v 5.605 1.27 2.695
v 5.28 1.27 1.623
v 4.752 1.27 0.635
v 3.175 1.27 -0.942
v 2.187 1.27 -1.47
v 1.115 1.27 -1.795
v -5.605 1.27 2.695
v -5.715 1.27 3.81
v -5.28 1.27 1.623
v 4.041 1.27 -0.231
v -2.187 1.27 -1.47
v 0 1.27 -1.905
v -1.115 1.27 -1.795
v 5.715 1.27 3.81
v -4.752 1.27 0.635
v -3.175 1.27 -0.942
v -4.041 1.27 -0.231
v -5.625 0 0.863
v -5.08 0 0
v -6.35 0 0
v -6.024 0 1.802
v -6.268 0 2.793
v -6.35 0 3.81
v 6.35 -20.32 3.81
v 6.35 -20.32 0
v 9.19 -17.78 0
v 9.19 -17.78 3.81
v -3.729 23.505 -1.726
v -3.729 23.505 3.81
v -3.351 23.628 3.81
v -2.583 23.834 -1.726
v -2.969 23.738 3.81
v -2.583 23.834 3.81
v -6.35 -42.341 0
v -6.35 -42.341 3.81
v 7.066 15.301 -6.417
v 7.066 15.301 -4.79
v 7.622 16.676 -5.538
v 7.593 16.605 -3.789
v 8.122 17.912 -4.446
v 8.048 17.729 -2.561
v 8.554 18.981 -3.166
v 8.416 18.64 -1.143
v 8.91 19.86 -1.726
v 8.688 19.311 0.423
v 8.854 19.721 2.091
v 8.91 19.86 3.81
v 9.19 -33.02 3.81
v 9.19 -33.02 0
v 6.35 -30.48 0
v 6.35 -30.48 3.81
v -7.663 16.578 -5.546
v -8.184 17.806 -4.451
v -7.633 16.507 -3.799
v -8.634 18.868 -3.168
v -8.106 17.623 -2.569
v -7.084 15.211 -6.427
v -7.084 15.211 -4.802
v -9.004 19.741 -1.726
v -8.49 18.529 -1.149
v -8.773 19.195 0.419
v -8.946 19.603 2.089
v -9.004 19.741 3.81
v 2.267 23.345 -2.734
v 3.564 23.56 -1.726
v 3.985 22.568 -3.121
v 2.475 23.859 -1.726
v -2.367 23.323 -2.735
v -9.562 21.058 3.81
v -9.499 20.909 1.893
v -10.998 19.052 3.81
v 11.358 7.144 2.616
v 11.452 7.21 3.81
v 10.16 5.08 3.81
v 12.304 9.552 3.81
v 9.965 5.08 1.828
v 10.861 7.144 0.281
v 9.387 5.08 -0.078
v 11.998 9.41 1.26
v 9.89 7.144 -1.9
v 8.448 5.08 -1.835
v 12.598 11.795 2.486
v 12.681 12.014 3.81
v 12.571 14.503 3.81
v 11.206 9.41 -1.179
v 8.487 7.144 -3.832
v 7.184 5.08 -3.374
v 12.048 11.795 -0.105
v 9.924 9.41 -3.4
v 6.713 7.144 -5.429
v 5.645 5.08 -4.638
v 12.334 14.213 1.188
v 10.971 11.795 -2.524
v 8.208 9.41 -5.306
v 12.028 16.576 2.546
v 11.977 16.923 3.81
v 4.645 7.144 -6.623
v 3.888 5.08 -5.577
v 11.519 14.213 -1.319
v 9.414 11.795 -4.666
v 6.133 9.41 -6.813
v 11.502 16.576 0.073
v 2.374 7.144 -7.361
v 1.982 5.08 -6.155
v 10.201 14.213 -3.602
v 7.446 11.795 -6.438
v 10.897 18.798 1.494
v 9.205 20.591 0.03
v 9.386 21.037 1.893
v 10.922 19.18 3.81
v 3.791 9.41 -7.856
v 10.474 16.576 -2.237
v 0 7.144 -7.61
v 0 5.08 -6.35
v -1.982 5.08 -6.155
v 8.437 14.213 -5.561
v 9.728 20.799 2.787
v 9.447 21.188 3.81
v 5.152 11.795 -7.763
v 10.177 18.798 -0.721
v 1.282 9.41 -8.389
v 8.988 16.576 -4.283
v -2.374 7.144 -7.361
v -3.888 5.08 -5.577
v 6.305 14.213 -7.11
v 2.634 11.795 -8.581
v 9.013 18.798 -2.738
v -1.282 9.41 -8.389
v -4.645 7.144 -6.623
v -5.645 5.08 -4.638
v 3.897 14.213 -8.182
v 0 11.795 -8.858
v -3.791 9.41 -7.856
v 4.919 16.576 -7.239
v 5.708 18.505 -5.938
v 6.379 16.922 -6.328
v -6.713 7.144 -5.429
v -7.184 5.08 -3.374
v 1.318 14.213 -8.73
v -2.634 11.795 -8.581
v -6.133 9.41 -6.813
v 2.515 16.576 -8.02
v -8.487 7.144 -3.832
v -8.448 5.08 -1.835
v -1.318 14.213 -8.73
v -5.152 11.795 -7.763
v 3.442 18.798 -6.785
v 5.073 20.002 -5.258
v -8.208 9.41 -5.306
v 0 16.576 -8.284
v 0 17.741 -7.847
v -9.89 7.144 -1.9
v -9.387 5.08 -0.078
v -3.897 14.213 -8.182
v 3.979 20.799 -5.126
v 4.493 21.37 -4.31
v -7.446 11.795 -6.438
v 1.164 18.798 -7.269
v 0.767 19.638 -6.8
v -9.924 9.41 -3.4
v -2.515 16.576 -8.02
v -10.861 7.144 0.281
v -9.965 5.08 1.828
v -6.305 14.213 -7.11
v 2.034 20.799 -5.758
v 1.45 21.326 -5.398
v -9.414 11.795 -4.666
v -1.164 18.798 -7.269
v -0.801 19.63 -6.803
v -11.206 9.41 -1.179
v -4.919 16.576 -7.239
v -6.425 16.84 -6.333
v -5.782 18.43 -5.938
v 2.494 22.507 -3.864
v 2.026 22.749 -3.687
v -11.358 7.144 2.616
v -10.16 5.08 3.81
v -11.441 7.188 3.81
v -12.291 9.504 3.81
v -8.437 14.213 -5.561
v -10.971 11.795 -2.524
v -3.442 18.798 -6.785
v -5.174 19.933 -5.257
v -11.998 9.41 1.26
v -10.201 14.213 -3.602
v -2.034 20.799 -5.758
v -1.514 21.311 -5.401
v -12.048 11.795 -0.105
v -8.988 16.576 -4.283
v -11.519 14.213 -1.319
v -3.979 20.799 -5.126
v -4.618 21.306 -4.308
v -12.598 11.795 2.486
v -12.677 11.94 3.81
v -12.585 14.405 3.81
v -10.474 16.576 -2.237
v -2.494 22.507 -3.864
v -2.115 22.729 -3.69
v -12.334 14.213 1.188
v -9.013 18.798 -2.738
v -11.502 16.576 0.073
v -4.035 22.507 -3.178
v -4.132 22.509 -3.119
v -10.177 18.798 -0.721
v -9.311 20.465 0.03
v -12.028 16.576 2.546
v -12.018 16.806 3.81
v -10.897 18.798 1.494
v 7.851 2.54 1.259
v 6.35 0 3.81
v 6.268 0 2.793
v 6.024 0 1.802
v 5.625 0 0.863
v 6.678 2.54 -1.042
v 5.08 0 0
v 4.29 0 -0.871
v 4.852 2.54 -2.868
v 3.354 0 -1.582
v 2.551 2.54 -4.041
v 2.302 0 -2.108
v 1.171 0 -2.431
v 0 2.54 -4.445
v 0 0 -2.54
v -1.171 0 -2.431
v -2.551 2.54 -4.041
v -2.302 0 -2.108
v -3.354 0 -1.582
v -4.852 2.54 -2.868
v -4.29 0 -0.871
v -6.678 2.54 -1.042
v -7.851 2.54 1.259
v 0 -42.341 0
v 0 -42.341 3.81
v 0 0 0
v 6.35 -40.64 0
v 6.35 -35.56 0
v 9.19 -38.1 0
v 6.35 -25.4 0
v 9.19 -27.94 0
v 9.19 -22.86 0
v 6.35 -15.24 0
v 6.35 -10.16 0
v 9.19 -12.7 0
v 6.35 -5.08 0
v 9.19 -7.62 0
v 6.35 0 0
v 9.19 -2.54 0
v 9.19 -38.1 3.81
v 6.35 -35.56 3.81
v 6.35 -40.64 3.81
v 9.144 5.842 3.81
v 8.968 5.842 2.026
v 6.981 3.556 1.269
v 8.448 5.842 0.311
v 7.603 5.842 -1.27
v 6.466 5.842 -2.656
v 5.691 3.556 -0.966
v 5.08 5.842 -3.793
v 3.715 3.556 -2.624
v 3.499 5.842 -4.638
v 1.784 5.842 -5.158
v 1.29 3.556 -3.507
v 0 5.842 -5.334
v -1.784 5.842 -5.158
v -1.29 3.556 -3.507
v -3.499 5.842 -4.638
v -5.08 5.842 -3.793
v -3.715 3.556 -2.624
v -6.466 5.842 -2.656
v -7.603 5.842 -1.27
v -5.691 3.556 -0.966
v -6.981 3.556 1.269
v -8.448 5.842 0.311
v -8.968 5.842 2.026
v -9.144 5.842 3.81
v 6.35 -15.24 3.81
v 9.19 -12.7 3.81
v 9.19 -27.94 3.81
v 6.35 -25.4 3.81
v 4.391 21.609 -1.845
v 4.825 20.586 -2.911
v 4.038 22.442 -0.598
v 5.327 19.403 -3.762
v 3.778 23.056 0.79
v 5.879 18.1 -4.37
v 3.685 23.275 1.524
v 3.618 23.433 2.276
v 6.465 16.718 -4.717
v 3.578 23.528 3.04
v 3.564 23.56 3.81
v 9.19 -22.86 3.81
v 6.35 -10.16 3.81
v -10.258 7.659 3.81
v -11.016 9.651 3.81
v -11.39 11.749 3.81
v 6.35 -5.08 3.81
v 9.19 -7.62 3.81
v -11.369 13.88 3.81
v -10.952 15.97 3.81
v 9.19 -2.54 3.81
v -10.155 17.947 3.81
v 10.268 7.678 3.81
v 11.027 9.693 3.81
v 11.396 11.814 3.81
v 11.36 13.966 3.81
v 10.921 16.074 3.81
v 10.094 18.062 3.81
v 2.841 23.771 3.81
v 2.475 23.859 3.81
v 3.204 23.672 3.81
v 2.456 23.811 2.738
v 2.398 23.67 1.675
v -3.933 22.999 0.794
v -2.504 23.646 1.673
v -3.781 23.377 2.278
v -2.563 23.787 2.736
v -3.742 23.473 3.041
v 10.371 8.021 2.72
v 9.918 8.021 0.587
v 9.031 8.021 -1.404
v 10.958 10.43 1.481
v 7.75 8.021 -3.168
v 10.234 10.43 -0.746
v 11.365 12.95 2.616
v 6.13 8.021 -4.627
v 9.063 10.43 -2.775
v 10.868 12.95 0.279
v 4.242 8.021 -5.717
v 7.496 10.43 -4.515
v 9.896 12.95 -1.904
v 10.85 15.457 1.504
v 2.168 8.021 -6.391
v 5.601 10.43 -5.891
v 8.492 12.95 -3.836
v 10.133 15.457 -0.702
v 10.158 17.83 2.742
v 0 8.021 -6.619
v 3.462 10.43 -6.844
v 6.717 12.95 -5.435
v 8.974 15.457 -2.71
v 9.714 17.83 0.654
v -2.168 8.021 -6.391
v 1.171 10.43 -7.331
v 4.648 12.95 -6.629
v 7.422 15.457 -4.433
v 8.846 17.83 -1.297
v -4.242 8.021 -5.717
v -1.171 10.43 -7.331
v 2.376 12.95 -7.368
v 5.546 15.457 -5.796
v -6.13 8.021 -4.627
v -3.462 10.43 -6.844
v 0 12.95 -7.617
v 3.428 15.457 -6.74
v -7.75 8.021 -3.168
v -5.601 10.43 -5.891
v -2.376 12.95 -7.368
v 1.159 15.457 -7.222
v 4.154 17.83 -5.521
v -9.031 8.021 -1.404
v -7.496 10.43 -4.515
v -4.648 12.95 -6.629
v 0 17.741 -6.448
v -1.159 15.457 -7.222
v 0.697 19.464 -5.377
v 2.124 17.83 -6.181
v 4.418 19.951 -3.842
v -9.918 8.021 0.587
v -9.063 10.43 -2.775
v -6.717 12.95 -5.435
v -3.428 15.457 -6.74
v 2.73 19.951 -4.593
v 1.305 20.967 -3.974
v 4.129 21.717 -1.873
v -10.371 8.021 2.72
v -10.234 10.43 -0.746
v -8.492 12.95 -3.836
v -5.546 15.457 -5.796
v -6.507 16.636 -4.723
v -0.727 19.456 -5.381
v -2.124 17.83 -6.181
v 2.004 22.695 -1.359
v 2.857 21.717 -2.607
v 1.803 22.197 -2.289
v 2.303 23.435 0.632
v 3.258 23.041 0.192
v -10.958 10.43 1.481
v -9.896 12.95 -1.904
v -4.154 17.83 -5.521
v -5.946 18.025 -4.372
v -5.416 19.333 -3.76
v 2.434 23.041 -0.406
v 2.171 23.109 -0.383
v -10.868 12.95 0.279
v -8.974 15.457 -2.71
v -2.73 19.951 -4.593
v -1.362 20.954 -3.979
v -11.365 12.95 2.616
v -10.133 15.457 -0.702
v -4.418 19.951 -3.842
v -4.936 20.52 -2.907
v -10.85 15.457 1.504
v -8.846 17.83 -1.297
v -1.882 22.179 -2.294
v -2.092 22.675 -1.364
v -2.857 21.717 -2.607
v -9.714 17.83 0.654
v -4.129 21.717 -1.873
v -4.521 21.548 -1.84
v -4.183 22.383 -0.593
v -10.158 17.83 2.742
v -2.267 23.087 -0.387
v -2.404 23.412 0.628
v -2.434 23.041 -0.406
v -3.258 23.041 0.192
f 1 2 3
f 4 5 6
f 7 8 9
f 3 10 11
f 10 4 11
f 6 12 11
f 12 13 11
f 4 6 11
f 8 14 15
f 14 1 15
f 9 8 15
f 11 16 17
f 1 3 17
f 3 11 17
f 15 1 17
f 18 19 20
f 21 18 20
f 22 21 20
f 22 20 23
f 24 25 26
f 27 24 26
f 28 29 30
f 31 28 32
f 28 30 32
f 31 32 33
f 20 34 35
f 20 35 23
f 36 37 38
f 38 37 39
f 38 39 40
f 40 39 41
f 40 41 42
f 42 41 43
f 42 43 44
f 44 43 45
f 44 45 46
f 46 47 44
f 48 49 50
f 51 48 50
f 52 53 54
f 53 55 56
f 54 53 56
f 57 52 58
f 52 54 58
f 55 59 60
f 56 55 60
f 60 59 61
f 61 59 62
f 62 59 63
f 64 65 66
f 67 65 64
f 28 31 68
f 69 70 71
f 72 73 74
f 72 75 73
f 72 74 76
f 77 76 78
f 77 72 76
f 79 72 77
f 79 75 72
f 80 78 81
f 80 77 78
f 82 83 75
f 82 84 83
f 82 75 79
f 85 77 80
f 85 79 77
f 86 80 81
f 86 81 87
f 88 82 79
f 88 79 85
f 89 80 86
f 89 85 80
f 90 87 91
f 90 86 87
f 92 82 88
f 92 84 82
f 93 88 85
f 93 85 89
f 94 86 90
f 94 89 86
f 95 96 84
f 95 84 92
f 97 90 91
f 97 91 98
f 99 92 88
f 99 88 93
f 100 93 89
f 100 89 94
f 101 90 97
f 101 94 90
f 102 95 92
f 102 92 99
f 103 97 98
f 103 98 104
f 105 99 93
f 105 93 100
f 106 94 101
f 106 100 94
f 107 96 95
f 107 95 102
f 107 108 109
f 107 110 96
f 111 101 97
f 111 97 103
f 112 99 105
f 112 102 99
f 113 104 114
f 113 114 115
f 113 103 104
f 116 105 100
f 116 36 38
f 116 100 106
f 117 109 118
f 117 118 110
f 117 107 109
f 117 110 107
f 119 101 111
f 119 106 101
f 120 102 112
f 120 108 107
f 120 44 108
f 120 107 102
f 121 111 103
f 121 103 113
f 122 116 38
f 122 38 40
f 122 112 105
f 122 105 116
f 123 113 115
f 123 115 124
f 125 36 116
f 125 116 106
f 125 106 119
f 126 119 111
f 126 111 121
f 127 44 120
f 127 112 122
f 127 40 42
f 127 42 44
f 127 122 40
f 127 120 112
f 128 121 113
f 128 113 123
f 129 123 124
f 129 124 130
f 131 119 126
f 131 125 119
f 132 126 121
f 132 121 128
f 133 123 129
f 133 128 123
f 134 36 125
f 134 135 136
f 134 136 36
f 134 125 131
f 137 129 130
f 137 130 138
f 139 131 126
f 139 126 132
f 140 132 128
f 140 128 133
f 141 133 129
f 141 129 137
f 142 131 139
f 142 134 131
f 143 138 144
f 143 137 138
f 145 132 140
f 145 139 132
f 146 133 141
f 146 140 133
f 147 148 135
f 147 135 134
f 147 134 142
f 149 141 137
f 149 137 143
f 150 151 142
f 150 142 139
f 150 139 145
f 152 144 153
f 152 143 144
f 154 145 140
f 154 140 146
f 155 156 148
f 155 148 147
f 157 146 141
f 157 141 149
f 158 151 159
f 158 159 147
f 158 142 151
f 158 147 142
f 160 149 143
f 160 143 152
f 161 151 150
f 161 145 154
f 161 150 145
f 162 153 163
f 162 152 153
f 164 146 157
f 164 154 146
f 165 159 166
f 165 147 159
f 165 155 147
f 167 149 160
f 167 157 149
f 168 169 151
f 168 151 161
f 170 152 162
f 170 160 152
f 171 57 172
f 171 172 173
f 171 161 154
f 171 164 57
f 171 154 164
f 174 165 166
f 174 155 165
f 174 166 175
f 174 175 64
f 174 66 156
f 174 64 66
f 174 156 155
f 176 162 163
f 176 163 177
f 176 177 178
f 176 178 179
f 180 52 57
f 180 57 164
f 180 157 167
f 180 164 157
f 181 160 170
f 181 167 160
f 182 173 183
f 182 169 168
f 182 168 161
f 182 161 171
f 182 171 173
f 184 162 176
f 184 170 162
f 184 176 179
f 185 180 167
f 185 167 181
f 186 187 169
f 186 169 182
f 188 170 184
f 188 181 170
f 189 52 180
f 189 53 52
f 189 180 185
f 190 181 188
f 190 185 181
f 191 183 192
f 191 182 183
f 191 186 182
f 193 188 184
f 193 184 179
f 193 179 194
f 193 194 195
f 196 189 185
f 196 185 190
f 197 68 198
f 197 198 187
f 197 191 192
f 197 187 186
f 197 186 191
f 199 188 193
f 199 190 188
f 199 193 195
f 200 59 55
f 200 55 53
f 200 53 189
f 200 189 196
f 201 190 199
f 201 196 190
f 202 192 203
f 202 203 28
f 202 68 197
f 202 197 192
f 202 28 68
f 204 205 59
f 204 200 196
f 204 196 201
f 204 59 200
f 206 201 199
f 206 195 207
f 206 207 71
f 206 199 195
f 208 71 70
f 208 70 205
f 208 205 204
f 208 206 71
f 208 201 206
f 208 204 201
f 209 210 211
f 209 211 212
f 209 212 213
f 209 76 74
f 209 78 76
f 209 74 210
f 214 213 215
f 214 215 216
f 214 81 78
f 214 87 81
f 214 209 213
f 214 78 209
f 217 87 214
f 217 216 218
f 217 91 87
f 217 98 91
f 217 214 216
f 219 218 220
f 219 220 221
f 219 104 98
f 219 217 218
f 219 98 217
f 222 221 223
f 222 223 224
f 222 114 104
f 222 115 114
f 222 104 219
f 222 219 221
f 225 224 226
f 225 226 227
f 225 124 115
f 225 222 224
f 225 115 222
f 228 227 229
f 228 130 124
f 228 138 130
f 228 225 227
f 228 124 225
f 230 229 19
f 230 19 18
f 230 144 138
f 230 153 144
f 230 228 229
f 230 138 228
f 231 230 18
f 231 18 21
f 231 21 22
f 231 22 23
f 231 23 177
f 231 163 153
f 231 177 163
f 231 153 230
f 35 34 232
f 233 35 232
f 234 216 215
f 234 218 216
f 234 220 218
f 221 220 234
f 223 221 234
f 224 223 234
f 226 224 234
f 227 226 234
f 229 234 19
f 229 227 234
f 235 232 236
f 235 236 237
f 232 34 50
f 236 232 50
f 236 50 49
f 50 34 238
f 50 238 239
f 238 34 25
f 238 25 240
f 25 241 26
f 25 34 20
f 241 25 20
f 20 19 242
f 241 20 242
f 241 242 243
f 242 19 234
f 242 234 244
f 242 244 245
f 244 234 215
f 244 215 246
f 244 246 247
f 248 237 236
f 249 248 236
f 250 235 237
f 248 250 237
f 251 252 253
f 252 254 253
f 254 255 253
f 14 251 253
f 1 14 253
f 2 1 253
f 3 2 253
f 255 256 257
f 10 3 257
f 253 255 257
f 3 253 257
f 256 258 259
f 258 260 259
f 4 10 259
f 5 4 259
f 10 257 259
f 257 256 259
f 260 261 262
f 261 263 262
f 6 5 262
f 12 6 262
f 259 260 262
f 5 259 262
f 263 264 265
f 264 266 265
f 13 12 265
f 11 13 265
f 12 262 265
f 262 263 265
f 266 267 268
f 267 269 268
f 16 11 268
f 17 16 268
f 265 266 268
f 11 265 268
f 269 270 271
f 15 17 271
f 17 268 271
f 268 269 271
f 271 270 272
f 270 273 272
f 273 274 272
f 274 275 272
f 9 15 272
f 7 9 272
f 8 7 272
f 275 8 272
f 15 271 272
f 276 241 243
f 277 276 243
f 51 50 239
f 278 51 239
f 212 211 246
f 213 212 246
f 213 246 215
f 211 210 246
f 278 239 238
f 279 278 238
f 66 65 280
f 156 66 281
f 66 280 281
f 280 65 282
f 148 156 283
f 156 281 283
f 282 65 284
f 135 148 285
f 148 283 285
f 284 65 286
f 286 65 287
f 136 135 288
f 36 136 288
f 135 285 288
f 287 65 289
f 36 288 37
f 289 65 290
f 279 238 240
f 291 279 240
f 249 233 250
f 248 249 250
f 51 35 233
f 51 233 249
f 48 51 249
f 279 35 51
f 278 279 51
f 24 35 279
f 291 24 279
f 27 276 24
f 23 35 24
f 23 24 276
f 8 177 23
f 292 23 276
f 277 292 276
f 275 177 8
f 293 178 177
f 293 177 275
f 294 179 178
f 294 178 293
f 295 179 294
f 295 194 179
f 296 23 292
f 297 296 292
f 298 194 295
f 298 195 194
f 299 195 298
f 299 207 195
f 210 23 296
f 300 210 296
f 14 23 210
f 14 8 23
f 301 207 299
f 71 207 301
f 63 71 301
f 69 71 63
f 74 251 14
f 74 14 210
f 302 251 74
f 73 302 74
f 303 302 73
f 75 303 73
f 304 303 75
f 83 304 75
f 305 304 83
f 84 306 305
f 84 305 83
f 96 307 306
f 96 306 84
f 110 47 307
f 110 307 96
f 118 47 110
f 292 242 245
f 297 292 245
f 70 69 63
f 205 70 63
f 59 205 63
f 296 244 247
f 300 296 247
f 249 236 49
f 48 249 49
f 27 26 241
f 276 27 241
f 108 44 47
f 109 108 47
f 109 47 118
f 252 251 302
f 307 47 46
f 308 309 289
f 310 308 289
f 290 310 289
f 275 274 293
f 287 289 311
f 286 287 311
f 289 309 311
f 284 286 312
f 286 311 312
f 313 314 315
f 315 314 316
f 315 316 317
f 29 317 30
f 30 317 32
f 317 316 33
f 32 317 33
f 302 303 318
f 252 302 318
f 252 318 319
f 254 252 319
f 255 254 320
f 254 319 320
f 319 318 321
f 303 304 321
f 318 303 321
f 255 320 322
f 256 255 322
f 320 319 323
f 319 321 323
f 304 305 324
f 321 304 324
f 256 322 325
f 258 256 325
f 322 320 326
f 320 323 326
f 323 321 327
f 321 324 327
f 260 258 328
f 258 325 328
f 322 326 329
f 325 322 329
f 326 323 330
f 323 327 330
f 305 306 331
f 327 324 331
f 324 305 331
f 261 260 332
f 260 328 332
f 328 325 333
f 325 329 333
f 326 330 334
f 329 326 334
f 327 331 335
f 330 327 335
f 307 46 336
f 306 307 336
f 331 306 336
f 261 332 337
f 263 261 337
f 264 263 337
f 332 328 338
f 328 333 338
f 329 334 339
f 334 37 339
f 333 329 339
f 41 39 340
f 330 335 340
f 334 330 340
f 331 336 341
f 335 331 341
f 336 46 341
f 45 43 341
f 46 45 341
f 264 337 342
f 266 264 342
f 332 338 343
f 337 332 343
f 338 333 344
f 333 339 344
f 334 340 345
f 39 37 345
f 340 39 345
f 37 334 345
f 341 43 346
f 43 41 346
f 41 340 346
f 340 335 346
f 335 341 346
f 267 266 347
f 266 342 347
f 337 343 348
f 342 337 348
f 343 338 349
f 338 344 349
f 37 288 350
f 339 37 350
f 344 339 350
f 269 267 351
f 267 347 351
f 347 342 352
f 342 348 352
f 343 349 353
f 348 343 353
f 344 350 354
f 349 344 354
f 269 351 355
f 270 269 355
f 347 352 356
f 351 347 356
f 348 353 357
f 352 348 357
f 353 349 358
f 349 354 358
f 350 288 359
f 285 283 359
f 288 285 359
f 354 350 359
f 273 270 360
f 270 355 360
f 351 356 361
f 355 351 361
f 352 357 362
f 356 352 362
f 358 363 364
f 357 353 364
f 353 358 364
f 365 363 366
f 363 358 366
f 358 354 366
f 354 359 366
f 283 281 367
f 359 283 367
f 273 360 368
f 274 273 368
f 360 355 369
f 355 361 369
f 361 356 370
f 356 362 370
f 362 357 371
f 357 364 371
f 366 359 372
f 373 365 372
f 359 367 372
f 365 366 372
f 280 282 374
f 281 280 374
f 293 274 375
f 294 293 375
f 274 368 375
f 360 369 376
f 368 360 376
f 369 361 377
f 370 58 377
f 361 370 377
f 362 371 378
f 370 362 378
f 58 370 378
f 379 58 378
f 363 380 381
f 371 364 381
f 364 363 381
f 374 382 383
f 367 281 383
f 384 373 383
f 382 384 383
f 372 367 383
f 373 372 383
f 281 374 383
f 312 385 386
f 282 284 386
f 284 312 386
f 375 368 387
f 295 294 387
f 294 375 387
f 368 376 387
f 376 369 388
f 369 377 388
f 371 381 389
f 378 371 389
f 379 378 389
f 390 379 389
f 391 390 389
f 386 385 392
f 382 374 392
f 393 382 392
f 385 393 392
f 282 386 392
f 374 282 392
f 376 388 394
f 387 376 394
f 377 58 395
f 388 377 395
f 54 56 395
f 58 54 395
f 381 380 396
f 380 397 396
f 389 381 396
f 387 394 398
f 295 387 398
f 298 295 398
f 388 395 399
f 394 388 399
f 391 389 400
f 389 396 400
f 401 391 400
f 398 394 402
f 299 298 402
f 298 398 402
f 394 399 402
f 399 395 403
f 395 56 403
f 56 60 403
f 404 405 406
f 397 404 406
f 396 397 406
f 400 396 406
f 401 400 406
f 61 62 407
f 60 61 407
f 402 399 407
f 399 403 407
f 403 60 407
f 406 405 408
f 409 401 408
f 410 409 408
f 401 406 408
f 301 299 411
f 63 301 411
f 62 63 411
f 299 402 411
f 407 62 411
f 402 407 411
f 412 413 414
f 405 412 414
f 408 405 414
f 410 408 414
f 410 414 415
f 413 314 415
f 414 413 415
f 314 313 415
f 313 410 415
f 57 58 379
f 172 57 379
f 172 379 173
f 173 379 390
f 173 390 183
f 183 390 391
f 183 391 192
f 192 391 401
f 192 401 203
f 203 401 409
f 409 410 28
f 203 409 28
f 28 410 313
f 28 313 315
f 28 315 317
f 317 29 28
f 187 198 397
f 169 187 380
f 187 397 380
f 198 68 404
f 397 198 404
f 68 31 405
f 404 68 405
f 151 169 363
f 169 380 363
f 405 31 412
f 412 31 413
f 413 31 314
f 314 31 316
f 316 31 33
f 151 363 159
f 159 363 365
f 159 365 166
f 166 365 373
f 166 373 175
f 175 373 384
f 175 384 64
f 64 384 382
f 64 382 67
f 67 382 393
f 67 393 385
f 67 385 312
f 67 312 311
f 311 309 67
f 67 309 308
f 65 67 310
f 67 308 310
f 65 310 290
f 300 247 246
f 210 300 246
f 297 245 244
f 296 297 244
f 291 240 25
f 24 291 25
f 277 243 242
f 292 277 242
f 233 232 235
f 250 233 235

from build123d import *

# Parameters (mm, degrees)
F0_W     = 6.35
F0_H     = 42.3414773719
F1_DEPTH = 3.81
F3_ANGLE = 180
F4_T     = -1.27
F7_DEPTH = 25.4


# Not quite as in the source:
# - a feature names something its author has since deleted; it is built from what else it names


with BuildPart() as f1:
    # F0 (on Top) → F1 (new body)
    with BuildSketch(Plane.XY):
        Polygon((6.35, -30.48), (6.35, -35.56), (9.1898063314, -33.02), align=None)
        Polygon((6.35, -35.56), (6.35, -40.64), (9.1898063314, -38.1), align=None)
        Polygon((6.35, -25.4), (6.35, -30.48), (9.1898063314, -27.94), align=None)
        Polygon((6.35, -20.32), (6.35, -25.4), (9.1898063314, -22.86), align=None)
        Polygon((9.1898063314, -17.78), (6.35, -15.24), (6.35, -20.32), align=None)
        Polygon((9.1898063314, -12.7), (6.35, -10.16), (6.35, -15.24), align=None)
        Polygon((9.1898063314, -7.62), (6.35, -5.08), (6.35, -10.16), align=None)
        Polygon((9.1898063314, -2.54), (6.35, 0), (6.35, -5.08), align=None)
        Polygon((6.35, 0), (0, 0), (0, -42.3414773719), (6.35, -40.64), (6.35, -35.56), (6.35, -30.48), (6.35, -25.4), (6.35, -20.32), (6.35, -15.24), (6.35, -10.16), (6.35, -5.08), align=None)
        with Locations((-3.175, -21.170738686)):
            Rectangle(F0_W, F0_H)
    extrude(amount=F1_DEPTH)


with BuildPart() as f3:
    # F2 (on face) → F3 (revolve)
    with BuildSketch(Plane.XY.offset(3.81)):
        with BuildLine():
            ThreePointArc((10.16, 5.08), (5.6796126628, 1.3407746743), (0, 0))
            Line((0, 0), (6.35, 0))
            Line((6.35, 0), (10.16, 5.08))
        make_face()
        with BuildLine():
            Line((0, 25.4), (0, 0))
            ThreePointArc((0, 0), (5.6796126628, 1.3407746743), (10.16, 5.08))
            ThreePointArc((10.16, 5.08), (11.3592253257, 18.3796126628), (0, 25.4))
        make_face()
    revolve(axis=Axis((0, 12.7, 3.81), (0, 1, 0)), revolution_arc=F3_ANGLE)

    # F4
    f4_openings = [f3.faces().sort_by_distance(p)[0] for p in [
        (0, 12.436594, 3.81),
    ]]
    offset(amount=F4_T, openings=f4_openings)


with BuildPart() as f1_1:
    add(f1.part)

    # F5: union F3
    add(f3.part)

    # F6 (on face) → F7 (cut)
    with BuildSketch(Plane.XY.offset(3.81)):
        with BuildLine():
            Line((8.9097454996, 19.8597021678), (9.4470019608, 21.1878827721))
            ThreePointArc((9.4470019608, 21.1878827721), (5.1717448117, 24.299269615), (0, 25.4))
            ThreePointArc((0, 25.4), (-1.5546529222, 25.304485483), (-3.0859212896, 25.0193786286))
            Line((-3.0859212896, 25.0193786286), (-2.5834265714, 23.8342178508))
            ThreePointArc((-2.5834265714, 23.8342178508), (-1.3001519074, 24.0558137101), (0, 24.13))
            ThreePointArc((0, 24.13), (1.2447495309, 24.0620200055), (2.4746927509, 23.8588886449))
            Line((2.4746927509, 23.8588886449), (2.9447663441, 25.0209828664))
            Line((2.9447663441, 25.0209828664), (3.5641672216, 23.5600926339))
            ThreePointArc((3.5641672216, 23.5600926339), (6.5056012054, 22.0979813234), (8.9097454996, 19.8597021678))
        make_face()
        with BuildLine():
            Line((7.0658245088, 15.3012458764), (8.9097454996, 19.8597021678))
            ThreePointArc((8.9097454996, 19.8597021678), (6.5056012054, 22.0979813234), (3.5641672216, 23.5600926339))
            Line((3.5641672216, 23.5600926339), (7.0658245088, 15.3012458764))
        make_face()
        with BuildLine():
            ThreePointArc((2.4746927509, 23.8588886449), (3.0231237497, 23.7229588947), (3.5641672216, 23.5600926339))
            Line((3.5641672216, 23.5600926339), (2.9447663441, 25.0209828664))
            Line((2.9447663441, 25.0209828664), (2.4746927509, 23.8588886449))
        make_face()
        with BuildLine():
            Line((-2.5834265714, 23.8342178508), (-3.0859212896, 25.0193786286))
            ThreePointArc((-3.0859212896, 25.0193786286), (-3.1028243507, 25.0151321978), (-3.1197215685, 25.0108625748))
            Line((-3.1197215685, 25.0108625748), (-3.7290136249, 23.5045988998))
            ThreePointArc((-3.7290136249, 23.5045988998), (-3.1605201267, 23.6843530774), (-2.5834265714, 23.8342178508))
        make_face()
        with BuildLine():
            Line((0, 17.7410675473), (2.4746927509, 23.8588886449))
            ThreePointArc((2.4746927509, 23.8588886449), (1.2447495309, 24.0620200055), (0, 24.13))
            ThreePointArc((0, 24.13), (-1.3001519074, 24.0558137101), (-2.5834265714, 23.8342178508))
            Line((-2.5834265714, 23.8342178508), (0, 17.7410675473))
        make_face()
        with BuildLine():
            Line((-3.7290136249, 23.5045988998), (-3.1197215685, 25.0108625748))
            ThreePointArc((-3.1197215685, 25.0108625748), (-6.6419627447, 23.5247092754), (-9.562361361, 21.0577057379))
            Line((-9.562361361, 21.0577057379), (-9.0040057437, 19.7407940296))
            ThreePointArc((-9.0040057437, 19.7407940296), (-6.6388253732, 22.0043483202), (-3.7290136249, 23.5045988998))
        make_face()
        with BuildLine():
            Line((-7.0836272172, 15.211478147), (-3.7290136249, 23.5045988998))
            ThreePointArc((-3.7290136249, 23.5045988998), (-6.6388253732, 22.0043483202), (-9.0040057437, 19.7407940296))
            Line((-9.0040057437, 19.7407940296), (-7.0836272172, 15.211478147))
        make_face()
    extrude(amount=-F7_DEPTH, mode=Mode.SUBTRACT)


solid = f1_1.part
